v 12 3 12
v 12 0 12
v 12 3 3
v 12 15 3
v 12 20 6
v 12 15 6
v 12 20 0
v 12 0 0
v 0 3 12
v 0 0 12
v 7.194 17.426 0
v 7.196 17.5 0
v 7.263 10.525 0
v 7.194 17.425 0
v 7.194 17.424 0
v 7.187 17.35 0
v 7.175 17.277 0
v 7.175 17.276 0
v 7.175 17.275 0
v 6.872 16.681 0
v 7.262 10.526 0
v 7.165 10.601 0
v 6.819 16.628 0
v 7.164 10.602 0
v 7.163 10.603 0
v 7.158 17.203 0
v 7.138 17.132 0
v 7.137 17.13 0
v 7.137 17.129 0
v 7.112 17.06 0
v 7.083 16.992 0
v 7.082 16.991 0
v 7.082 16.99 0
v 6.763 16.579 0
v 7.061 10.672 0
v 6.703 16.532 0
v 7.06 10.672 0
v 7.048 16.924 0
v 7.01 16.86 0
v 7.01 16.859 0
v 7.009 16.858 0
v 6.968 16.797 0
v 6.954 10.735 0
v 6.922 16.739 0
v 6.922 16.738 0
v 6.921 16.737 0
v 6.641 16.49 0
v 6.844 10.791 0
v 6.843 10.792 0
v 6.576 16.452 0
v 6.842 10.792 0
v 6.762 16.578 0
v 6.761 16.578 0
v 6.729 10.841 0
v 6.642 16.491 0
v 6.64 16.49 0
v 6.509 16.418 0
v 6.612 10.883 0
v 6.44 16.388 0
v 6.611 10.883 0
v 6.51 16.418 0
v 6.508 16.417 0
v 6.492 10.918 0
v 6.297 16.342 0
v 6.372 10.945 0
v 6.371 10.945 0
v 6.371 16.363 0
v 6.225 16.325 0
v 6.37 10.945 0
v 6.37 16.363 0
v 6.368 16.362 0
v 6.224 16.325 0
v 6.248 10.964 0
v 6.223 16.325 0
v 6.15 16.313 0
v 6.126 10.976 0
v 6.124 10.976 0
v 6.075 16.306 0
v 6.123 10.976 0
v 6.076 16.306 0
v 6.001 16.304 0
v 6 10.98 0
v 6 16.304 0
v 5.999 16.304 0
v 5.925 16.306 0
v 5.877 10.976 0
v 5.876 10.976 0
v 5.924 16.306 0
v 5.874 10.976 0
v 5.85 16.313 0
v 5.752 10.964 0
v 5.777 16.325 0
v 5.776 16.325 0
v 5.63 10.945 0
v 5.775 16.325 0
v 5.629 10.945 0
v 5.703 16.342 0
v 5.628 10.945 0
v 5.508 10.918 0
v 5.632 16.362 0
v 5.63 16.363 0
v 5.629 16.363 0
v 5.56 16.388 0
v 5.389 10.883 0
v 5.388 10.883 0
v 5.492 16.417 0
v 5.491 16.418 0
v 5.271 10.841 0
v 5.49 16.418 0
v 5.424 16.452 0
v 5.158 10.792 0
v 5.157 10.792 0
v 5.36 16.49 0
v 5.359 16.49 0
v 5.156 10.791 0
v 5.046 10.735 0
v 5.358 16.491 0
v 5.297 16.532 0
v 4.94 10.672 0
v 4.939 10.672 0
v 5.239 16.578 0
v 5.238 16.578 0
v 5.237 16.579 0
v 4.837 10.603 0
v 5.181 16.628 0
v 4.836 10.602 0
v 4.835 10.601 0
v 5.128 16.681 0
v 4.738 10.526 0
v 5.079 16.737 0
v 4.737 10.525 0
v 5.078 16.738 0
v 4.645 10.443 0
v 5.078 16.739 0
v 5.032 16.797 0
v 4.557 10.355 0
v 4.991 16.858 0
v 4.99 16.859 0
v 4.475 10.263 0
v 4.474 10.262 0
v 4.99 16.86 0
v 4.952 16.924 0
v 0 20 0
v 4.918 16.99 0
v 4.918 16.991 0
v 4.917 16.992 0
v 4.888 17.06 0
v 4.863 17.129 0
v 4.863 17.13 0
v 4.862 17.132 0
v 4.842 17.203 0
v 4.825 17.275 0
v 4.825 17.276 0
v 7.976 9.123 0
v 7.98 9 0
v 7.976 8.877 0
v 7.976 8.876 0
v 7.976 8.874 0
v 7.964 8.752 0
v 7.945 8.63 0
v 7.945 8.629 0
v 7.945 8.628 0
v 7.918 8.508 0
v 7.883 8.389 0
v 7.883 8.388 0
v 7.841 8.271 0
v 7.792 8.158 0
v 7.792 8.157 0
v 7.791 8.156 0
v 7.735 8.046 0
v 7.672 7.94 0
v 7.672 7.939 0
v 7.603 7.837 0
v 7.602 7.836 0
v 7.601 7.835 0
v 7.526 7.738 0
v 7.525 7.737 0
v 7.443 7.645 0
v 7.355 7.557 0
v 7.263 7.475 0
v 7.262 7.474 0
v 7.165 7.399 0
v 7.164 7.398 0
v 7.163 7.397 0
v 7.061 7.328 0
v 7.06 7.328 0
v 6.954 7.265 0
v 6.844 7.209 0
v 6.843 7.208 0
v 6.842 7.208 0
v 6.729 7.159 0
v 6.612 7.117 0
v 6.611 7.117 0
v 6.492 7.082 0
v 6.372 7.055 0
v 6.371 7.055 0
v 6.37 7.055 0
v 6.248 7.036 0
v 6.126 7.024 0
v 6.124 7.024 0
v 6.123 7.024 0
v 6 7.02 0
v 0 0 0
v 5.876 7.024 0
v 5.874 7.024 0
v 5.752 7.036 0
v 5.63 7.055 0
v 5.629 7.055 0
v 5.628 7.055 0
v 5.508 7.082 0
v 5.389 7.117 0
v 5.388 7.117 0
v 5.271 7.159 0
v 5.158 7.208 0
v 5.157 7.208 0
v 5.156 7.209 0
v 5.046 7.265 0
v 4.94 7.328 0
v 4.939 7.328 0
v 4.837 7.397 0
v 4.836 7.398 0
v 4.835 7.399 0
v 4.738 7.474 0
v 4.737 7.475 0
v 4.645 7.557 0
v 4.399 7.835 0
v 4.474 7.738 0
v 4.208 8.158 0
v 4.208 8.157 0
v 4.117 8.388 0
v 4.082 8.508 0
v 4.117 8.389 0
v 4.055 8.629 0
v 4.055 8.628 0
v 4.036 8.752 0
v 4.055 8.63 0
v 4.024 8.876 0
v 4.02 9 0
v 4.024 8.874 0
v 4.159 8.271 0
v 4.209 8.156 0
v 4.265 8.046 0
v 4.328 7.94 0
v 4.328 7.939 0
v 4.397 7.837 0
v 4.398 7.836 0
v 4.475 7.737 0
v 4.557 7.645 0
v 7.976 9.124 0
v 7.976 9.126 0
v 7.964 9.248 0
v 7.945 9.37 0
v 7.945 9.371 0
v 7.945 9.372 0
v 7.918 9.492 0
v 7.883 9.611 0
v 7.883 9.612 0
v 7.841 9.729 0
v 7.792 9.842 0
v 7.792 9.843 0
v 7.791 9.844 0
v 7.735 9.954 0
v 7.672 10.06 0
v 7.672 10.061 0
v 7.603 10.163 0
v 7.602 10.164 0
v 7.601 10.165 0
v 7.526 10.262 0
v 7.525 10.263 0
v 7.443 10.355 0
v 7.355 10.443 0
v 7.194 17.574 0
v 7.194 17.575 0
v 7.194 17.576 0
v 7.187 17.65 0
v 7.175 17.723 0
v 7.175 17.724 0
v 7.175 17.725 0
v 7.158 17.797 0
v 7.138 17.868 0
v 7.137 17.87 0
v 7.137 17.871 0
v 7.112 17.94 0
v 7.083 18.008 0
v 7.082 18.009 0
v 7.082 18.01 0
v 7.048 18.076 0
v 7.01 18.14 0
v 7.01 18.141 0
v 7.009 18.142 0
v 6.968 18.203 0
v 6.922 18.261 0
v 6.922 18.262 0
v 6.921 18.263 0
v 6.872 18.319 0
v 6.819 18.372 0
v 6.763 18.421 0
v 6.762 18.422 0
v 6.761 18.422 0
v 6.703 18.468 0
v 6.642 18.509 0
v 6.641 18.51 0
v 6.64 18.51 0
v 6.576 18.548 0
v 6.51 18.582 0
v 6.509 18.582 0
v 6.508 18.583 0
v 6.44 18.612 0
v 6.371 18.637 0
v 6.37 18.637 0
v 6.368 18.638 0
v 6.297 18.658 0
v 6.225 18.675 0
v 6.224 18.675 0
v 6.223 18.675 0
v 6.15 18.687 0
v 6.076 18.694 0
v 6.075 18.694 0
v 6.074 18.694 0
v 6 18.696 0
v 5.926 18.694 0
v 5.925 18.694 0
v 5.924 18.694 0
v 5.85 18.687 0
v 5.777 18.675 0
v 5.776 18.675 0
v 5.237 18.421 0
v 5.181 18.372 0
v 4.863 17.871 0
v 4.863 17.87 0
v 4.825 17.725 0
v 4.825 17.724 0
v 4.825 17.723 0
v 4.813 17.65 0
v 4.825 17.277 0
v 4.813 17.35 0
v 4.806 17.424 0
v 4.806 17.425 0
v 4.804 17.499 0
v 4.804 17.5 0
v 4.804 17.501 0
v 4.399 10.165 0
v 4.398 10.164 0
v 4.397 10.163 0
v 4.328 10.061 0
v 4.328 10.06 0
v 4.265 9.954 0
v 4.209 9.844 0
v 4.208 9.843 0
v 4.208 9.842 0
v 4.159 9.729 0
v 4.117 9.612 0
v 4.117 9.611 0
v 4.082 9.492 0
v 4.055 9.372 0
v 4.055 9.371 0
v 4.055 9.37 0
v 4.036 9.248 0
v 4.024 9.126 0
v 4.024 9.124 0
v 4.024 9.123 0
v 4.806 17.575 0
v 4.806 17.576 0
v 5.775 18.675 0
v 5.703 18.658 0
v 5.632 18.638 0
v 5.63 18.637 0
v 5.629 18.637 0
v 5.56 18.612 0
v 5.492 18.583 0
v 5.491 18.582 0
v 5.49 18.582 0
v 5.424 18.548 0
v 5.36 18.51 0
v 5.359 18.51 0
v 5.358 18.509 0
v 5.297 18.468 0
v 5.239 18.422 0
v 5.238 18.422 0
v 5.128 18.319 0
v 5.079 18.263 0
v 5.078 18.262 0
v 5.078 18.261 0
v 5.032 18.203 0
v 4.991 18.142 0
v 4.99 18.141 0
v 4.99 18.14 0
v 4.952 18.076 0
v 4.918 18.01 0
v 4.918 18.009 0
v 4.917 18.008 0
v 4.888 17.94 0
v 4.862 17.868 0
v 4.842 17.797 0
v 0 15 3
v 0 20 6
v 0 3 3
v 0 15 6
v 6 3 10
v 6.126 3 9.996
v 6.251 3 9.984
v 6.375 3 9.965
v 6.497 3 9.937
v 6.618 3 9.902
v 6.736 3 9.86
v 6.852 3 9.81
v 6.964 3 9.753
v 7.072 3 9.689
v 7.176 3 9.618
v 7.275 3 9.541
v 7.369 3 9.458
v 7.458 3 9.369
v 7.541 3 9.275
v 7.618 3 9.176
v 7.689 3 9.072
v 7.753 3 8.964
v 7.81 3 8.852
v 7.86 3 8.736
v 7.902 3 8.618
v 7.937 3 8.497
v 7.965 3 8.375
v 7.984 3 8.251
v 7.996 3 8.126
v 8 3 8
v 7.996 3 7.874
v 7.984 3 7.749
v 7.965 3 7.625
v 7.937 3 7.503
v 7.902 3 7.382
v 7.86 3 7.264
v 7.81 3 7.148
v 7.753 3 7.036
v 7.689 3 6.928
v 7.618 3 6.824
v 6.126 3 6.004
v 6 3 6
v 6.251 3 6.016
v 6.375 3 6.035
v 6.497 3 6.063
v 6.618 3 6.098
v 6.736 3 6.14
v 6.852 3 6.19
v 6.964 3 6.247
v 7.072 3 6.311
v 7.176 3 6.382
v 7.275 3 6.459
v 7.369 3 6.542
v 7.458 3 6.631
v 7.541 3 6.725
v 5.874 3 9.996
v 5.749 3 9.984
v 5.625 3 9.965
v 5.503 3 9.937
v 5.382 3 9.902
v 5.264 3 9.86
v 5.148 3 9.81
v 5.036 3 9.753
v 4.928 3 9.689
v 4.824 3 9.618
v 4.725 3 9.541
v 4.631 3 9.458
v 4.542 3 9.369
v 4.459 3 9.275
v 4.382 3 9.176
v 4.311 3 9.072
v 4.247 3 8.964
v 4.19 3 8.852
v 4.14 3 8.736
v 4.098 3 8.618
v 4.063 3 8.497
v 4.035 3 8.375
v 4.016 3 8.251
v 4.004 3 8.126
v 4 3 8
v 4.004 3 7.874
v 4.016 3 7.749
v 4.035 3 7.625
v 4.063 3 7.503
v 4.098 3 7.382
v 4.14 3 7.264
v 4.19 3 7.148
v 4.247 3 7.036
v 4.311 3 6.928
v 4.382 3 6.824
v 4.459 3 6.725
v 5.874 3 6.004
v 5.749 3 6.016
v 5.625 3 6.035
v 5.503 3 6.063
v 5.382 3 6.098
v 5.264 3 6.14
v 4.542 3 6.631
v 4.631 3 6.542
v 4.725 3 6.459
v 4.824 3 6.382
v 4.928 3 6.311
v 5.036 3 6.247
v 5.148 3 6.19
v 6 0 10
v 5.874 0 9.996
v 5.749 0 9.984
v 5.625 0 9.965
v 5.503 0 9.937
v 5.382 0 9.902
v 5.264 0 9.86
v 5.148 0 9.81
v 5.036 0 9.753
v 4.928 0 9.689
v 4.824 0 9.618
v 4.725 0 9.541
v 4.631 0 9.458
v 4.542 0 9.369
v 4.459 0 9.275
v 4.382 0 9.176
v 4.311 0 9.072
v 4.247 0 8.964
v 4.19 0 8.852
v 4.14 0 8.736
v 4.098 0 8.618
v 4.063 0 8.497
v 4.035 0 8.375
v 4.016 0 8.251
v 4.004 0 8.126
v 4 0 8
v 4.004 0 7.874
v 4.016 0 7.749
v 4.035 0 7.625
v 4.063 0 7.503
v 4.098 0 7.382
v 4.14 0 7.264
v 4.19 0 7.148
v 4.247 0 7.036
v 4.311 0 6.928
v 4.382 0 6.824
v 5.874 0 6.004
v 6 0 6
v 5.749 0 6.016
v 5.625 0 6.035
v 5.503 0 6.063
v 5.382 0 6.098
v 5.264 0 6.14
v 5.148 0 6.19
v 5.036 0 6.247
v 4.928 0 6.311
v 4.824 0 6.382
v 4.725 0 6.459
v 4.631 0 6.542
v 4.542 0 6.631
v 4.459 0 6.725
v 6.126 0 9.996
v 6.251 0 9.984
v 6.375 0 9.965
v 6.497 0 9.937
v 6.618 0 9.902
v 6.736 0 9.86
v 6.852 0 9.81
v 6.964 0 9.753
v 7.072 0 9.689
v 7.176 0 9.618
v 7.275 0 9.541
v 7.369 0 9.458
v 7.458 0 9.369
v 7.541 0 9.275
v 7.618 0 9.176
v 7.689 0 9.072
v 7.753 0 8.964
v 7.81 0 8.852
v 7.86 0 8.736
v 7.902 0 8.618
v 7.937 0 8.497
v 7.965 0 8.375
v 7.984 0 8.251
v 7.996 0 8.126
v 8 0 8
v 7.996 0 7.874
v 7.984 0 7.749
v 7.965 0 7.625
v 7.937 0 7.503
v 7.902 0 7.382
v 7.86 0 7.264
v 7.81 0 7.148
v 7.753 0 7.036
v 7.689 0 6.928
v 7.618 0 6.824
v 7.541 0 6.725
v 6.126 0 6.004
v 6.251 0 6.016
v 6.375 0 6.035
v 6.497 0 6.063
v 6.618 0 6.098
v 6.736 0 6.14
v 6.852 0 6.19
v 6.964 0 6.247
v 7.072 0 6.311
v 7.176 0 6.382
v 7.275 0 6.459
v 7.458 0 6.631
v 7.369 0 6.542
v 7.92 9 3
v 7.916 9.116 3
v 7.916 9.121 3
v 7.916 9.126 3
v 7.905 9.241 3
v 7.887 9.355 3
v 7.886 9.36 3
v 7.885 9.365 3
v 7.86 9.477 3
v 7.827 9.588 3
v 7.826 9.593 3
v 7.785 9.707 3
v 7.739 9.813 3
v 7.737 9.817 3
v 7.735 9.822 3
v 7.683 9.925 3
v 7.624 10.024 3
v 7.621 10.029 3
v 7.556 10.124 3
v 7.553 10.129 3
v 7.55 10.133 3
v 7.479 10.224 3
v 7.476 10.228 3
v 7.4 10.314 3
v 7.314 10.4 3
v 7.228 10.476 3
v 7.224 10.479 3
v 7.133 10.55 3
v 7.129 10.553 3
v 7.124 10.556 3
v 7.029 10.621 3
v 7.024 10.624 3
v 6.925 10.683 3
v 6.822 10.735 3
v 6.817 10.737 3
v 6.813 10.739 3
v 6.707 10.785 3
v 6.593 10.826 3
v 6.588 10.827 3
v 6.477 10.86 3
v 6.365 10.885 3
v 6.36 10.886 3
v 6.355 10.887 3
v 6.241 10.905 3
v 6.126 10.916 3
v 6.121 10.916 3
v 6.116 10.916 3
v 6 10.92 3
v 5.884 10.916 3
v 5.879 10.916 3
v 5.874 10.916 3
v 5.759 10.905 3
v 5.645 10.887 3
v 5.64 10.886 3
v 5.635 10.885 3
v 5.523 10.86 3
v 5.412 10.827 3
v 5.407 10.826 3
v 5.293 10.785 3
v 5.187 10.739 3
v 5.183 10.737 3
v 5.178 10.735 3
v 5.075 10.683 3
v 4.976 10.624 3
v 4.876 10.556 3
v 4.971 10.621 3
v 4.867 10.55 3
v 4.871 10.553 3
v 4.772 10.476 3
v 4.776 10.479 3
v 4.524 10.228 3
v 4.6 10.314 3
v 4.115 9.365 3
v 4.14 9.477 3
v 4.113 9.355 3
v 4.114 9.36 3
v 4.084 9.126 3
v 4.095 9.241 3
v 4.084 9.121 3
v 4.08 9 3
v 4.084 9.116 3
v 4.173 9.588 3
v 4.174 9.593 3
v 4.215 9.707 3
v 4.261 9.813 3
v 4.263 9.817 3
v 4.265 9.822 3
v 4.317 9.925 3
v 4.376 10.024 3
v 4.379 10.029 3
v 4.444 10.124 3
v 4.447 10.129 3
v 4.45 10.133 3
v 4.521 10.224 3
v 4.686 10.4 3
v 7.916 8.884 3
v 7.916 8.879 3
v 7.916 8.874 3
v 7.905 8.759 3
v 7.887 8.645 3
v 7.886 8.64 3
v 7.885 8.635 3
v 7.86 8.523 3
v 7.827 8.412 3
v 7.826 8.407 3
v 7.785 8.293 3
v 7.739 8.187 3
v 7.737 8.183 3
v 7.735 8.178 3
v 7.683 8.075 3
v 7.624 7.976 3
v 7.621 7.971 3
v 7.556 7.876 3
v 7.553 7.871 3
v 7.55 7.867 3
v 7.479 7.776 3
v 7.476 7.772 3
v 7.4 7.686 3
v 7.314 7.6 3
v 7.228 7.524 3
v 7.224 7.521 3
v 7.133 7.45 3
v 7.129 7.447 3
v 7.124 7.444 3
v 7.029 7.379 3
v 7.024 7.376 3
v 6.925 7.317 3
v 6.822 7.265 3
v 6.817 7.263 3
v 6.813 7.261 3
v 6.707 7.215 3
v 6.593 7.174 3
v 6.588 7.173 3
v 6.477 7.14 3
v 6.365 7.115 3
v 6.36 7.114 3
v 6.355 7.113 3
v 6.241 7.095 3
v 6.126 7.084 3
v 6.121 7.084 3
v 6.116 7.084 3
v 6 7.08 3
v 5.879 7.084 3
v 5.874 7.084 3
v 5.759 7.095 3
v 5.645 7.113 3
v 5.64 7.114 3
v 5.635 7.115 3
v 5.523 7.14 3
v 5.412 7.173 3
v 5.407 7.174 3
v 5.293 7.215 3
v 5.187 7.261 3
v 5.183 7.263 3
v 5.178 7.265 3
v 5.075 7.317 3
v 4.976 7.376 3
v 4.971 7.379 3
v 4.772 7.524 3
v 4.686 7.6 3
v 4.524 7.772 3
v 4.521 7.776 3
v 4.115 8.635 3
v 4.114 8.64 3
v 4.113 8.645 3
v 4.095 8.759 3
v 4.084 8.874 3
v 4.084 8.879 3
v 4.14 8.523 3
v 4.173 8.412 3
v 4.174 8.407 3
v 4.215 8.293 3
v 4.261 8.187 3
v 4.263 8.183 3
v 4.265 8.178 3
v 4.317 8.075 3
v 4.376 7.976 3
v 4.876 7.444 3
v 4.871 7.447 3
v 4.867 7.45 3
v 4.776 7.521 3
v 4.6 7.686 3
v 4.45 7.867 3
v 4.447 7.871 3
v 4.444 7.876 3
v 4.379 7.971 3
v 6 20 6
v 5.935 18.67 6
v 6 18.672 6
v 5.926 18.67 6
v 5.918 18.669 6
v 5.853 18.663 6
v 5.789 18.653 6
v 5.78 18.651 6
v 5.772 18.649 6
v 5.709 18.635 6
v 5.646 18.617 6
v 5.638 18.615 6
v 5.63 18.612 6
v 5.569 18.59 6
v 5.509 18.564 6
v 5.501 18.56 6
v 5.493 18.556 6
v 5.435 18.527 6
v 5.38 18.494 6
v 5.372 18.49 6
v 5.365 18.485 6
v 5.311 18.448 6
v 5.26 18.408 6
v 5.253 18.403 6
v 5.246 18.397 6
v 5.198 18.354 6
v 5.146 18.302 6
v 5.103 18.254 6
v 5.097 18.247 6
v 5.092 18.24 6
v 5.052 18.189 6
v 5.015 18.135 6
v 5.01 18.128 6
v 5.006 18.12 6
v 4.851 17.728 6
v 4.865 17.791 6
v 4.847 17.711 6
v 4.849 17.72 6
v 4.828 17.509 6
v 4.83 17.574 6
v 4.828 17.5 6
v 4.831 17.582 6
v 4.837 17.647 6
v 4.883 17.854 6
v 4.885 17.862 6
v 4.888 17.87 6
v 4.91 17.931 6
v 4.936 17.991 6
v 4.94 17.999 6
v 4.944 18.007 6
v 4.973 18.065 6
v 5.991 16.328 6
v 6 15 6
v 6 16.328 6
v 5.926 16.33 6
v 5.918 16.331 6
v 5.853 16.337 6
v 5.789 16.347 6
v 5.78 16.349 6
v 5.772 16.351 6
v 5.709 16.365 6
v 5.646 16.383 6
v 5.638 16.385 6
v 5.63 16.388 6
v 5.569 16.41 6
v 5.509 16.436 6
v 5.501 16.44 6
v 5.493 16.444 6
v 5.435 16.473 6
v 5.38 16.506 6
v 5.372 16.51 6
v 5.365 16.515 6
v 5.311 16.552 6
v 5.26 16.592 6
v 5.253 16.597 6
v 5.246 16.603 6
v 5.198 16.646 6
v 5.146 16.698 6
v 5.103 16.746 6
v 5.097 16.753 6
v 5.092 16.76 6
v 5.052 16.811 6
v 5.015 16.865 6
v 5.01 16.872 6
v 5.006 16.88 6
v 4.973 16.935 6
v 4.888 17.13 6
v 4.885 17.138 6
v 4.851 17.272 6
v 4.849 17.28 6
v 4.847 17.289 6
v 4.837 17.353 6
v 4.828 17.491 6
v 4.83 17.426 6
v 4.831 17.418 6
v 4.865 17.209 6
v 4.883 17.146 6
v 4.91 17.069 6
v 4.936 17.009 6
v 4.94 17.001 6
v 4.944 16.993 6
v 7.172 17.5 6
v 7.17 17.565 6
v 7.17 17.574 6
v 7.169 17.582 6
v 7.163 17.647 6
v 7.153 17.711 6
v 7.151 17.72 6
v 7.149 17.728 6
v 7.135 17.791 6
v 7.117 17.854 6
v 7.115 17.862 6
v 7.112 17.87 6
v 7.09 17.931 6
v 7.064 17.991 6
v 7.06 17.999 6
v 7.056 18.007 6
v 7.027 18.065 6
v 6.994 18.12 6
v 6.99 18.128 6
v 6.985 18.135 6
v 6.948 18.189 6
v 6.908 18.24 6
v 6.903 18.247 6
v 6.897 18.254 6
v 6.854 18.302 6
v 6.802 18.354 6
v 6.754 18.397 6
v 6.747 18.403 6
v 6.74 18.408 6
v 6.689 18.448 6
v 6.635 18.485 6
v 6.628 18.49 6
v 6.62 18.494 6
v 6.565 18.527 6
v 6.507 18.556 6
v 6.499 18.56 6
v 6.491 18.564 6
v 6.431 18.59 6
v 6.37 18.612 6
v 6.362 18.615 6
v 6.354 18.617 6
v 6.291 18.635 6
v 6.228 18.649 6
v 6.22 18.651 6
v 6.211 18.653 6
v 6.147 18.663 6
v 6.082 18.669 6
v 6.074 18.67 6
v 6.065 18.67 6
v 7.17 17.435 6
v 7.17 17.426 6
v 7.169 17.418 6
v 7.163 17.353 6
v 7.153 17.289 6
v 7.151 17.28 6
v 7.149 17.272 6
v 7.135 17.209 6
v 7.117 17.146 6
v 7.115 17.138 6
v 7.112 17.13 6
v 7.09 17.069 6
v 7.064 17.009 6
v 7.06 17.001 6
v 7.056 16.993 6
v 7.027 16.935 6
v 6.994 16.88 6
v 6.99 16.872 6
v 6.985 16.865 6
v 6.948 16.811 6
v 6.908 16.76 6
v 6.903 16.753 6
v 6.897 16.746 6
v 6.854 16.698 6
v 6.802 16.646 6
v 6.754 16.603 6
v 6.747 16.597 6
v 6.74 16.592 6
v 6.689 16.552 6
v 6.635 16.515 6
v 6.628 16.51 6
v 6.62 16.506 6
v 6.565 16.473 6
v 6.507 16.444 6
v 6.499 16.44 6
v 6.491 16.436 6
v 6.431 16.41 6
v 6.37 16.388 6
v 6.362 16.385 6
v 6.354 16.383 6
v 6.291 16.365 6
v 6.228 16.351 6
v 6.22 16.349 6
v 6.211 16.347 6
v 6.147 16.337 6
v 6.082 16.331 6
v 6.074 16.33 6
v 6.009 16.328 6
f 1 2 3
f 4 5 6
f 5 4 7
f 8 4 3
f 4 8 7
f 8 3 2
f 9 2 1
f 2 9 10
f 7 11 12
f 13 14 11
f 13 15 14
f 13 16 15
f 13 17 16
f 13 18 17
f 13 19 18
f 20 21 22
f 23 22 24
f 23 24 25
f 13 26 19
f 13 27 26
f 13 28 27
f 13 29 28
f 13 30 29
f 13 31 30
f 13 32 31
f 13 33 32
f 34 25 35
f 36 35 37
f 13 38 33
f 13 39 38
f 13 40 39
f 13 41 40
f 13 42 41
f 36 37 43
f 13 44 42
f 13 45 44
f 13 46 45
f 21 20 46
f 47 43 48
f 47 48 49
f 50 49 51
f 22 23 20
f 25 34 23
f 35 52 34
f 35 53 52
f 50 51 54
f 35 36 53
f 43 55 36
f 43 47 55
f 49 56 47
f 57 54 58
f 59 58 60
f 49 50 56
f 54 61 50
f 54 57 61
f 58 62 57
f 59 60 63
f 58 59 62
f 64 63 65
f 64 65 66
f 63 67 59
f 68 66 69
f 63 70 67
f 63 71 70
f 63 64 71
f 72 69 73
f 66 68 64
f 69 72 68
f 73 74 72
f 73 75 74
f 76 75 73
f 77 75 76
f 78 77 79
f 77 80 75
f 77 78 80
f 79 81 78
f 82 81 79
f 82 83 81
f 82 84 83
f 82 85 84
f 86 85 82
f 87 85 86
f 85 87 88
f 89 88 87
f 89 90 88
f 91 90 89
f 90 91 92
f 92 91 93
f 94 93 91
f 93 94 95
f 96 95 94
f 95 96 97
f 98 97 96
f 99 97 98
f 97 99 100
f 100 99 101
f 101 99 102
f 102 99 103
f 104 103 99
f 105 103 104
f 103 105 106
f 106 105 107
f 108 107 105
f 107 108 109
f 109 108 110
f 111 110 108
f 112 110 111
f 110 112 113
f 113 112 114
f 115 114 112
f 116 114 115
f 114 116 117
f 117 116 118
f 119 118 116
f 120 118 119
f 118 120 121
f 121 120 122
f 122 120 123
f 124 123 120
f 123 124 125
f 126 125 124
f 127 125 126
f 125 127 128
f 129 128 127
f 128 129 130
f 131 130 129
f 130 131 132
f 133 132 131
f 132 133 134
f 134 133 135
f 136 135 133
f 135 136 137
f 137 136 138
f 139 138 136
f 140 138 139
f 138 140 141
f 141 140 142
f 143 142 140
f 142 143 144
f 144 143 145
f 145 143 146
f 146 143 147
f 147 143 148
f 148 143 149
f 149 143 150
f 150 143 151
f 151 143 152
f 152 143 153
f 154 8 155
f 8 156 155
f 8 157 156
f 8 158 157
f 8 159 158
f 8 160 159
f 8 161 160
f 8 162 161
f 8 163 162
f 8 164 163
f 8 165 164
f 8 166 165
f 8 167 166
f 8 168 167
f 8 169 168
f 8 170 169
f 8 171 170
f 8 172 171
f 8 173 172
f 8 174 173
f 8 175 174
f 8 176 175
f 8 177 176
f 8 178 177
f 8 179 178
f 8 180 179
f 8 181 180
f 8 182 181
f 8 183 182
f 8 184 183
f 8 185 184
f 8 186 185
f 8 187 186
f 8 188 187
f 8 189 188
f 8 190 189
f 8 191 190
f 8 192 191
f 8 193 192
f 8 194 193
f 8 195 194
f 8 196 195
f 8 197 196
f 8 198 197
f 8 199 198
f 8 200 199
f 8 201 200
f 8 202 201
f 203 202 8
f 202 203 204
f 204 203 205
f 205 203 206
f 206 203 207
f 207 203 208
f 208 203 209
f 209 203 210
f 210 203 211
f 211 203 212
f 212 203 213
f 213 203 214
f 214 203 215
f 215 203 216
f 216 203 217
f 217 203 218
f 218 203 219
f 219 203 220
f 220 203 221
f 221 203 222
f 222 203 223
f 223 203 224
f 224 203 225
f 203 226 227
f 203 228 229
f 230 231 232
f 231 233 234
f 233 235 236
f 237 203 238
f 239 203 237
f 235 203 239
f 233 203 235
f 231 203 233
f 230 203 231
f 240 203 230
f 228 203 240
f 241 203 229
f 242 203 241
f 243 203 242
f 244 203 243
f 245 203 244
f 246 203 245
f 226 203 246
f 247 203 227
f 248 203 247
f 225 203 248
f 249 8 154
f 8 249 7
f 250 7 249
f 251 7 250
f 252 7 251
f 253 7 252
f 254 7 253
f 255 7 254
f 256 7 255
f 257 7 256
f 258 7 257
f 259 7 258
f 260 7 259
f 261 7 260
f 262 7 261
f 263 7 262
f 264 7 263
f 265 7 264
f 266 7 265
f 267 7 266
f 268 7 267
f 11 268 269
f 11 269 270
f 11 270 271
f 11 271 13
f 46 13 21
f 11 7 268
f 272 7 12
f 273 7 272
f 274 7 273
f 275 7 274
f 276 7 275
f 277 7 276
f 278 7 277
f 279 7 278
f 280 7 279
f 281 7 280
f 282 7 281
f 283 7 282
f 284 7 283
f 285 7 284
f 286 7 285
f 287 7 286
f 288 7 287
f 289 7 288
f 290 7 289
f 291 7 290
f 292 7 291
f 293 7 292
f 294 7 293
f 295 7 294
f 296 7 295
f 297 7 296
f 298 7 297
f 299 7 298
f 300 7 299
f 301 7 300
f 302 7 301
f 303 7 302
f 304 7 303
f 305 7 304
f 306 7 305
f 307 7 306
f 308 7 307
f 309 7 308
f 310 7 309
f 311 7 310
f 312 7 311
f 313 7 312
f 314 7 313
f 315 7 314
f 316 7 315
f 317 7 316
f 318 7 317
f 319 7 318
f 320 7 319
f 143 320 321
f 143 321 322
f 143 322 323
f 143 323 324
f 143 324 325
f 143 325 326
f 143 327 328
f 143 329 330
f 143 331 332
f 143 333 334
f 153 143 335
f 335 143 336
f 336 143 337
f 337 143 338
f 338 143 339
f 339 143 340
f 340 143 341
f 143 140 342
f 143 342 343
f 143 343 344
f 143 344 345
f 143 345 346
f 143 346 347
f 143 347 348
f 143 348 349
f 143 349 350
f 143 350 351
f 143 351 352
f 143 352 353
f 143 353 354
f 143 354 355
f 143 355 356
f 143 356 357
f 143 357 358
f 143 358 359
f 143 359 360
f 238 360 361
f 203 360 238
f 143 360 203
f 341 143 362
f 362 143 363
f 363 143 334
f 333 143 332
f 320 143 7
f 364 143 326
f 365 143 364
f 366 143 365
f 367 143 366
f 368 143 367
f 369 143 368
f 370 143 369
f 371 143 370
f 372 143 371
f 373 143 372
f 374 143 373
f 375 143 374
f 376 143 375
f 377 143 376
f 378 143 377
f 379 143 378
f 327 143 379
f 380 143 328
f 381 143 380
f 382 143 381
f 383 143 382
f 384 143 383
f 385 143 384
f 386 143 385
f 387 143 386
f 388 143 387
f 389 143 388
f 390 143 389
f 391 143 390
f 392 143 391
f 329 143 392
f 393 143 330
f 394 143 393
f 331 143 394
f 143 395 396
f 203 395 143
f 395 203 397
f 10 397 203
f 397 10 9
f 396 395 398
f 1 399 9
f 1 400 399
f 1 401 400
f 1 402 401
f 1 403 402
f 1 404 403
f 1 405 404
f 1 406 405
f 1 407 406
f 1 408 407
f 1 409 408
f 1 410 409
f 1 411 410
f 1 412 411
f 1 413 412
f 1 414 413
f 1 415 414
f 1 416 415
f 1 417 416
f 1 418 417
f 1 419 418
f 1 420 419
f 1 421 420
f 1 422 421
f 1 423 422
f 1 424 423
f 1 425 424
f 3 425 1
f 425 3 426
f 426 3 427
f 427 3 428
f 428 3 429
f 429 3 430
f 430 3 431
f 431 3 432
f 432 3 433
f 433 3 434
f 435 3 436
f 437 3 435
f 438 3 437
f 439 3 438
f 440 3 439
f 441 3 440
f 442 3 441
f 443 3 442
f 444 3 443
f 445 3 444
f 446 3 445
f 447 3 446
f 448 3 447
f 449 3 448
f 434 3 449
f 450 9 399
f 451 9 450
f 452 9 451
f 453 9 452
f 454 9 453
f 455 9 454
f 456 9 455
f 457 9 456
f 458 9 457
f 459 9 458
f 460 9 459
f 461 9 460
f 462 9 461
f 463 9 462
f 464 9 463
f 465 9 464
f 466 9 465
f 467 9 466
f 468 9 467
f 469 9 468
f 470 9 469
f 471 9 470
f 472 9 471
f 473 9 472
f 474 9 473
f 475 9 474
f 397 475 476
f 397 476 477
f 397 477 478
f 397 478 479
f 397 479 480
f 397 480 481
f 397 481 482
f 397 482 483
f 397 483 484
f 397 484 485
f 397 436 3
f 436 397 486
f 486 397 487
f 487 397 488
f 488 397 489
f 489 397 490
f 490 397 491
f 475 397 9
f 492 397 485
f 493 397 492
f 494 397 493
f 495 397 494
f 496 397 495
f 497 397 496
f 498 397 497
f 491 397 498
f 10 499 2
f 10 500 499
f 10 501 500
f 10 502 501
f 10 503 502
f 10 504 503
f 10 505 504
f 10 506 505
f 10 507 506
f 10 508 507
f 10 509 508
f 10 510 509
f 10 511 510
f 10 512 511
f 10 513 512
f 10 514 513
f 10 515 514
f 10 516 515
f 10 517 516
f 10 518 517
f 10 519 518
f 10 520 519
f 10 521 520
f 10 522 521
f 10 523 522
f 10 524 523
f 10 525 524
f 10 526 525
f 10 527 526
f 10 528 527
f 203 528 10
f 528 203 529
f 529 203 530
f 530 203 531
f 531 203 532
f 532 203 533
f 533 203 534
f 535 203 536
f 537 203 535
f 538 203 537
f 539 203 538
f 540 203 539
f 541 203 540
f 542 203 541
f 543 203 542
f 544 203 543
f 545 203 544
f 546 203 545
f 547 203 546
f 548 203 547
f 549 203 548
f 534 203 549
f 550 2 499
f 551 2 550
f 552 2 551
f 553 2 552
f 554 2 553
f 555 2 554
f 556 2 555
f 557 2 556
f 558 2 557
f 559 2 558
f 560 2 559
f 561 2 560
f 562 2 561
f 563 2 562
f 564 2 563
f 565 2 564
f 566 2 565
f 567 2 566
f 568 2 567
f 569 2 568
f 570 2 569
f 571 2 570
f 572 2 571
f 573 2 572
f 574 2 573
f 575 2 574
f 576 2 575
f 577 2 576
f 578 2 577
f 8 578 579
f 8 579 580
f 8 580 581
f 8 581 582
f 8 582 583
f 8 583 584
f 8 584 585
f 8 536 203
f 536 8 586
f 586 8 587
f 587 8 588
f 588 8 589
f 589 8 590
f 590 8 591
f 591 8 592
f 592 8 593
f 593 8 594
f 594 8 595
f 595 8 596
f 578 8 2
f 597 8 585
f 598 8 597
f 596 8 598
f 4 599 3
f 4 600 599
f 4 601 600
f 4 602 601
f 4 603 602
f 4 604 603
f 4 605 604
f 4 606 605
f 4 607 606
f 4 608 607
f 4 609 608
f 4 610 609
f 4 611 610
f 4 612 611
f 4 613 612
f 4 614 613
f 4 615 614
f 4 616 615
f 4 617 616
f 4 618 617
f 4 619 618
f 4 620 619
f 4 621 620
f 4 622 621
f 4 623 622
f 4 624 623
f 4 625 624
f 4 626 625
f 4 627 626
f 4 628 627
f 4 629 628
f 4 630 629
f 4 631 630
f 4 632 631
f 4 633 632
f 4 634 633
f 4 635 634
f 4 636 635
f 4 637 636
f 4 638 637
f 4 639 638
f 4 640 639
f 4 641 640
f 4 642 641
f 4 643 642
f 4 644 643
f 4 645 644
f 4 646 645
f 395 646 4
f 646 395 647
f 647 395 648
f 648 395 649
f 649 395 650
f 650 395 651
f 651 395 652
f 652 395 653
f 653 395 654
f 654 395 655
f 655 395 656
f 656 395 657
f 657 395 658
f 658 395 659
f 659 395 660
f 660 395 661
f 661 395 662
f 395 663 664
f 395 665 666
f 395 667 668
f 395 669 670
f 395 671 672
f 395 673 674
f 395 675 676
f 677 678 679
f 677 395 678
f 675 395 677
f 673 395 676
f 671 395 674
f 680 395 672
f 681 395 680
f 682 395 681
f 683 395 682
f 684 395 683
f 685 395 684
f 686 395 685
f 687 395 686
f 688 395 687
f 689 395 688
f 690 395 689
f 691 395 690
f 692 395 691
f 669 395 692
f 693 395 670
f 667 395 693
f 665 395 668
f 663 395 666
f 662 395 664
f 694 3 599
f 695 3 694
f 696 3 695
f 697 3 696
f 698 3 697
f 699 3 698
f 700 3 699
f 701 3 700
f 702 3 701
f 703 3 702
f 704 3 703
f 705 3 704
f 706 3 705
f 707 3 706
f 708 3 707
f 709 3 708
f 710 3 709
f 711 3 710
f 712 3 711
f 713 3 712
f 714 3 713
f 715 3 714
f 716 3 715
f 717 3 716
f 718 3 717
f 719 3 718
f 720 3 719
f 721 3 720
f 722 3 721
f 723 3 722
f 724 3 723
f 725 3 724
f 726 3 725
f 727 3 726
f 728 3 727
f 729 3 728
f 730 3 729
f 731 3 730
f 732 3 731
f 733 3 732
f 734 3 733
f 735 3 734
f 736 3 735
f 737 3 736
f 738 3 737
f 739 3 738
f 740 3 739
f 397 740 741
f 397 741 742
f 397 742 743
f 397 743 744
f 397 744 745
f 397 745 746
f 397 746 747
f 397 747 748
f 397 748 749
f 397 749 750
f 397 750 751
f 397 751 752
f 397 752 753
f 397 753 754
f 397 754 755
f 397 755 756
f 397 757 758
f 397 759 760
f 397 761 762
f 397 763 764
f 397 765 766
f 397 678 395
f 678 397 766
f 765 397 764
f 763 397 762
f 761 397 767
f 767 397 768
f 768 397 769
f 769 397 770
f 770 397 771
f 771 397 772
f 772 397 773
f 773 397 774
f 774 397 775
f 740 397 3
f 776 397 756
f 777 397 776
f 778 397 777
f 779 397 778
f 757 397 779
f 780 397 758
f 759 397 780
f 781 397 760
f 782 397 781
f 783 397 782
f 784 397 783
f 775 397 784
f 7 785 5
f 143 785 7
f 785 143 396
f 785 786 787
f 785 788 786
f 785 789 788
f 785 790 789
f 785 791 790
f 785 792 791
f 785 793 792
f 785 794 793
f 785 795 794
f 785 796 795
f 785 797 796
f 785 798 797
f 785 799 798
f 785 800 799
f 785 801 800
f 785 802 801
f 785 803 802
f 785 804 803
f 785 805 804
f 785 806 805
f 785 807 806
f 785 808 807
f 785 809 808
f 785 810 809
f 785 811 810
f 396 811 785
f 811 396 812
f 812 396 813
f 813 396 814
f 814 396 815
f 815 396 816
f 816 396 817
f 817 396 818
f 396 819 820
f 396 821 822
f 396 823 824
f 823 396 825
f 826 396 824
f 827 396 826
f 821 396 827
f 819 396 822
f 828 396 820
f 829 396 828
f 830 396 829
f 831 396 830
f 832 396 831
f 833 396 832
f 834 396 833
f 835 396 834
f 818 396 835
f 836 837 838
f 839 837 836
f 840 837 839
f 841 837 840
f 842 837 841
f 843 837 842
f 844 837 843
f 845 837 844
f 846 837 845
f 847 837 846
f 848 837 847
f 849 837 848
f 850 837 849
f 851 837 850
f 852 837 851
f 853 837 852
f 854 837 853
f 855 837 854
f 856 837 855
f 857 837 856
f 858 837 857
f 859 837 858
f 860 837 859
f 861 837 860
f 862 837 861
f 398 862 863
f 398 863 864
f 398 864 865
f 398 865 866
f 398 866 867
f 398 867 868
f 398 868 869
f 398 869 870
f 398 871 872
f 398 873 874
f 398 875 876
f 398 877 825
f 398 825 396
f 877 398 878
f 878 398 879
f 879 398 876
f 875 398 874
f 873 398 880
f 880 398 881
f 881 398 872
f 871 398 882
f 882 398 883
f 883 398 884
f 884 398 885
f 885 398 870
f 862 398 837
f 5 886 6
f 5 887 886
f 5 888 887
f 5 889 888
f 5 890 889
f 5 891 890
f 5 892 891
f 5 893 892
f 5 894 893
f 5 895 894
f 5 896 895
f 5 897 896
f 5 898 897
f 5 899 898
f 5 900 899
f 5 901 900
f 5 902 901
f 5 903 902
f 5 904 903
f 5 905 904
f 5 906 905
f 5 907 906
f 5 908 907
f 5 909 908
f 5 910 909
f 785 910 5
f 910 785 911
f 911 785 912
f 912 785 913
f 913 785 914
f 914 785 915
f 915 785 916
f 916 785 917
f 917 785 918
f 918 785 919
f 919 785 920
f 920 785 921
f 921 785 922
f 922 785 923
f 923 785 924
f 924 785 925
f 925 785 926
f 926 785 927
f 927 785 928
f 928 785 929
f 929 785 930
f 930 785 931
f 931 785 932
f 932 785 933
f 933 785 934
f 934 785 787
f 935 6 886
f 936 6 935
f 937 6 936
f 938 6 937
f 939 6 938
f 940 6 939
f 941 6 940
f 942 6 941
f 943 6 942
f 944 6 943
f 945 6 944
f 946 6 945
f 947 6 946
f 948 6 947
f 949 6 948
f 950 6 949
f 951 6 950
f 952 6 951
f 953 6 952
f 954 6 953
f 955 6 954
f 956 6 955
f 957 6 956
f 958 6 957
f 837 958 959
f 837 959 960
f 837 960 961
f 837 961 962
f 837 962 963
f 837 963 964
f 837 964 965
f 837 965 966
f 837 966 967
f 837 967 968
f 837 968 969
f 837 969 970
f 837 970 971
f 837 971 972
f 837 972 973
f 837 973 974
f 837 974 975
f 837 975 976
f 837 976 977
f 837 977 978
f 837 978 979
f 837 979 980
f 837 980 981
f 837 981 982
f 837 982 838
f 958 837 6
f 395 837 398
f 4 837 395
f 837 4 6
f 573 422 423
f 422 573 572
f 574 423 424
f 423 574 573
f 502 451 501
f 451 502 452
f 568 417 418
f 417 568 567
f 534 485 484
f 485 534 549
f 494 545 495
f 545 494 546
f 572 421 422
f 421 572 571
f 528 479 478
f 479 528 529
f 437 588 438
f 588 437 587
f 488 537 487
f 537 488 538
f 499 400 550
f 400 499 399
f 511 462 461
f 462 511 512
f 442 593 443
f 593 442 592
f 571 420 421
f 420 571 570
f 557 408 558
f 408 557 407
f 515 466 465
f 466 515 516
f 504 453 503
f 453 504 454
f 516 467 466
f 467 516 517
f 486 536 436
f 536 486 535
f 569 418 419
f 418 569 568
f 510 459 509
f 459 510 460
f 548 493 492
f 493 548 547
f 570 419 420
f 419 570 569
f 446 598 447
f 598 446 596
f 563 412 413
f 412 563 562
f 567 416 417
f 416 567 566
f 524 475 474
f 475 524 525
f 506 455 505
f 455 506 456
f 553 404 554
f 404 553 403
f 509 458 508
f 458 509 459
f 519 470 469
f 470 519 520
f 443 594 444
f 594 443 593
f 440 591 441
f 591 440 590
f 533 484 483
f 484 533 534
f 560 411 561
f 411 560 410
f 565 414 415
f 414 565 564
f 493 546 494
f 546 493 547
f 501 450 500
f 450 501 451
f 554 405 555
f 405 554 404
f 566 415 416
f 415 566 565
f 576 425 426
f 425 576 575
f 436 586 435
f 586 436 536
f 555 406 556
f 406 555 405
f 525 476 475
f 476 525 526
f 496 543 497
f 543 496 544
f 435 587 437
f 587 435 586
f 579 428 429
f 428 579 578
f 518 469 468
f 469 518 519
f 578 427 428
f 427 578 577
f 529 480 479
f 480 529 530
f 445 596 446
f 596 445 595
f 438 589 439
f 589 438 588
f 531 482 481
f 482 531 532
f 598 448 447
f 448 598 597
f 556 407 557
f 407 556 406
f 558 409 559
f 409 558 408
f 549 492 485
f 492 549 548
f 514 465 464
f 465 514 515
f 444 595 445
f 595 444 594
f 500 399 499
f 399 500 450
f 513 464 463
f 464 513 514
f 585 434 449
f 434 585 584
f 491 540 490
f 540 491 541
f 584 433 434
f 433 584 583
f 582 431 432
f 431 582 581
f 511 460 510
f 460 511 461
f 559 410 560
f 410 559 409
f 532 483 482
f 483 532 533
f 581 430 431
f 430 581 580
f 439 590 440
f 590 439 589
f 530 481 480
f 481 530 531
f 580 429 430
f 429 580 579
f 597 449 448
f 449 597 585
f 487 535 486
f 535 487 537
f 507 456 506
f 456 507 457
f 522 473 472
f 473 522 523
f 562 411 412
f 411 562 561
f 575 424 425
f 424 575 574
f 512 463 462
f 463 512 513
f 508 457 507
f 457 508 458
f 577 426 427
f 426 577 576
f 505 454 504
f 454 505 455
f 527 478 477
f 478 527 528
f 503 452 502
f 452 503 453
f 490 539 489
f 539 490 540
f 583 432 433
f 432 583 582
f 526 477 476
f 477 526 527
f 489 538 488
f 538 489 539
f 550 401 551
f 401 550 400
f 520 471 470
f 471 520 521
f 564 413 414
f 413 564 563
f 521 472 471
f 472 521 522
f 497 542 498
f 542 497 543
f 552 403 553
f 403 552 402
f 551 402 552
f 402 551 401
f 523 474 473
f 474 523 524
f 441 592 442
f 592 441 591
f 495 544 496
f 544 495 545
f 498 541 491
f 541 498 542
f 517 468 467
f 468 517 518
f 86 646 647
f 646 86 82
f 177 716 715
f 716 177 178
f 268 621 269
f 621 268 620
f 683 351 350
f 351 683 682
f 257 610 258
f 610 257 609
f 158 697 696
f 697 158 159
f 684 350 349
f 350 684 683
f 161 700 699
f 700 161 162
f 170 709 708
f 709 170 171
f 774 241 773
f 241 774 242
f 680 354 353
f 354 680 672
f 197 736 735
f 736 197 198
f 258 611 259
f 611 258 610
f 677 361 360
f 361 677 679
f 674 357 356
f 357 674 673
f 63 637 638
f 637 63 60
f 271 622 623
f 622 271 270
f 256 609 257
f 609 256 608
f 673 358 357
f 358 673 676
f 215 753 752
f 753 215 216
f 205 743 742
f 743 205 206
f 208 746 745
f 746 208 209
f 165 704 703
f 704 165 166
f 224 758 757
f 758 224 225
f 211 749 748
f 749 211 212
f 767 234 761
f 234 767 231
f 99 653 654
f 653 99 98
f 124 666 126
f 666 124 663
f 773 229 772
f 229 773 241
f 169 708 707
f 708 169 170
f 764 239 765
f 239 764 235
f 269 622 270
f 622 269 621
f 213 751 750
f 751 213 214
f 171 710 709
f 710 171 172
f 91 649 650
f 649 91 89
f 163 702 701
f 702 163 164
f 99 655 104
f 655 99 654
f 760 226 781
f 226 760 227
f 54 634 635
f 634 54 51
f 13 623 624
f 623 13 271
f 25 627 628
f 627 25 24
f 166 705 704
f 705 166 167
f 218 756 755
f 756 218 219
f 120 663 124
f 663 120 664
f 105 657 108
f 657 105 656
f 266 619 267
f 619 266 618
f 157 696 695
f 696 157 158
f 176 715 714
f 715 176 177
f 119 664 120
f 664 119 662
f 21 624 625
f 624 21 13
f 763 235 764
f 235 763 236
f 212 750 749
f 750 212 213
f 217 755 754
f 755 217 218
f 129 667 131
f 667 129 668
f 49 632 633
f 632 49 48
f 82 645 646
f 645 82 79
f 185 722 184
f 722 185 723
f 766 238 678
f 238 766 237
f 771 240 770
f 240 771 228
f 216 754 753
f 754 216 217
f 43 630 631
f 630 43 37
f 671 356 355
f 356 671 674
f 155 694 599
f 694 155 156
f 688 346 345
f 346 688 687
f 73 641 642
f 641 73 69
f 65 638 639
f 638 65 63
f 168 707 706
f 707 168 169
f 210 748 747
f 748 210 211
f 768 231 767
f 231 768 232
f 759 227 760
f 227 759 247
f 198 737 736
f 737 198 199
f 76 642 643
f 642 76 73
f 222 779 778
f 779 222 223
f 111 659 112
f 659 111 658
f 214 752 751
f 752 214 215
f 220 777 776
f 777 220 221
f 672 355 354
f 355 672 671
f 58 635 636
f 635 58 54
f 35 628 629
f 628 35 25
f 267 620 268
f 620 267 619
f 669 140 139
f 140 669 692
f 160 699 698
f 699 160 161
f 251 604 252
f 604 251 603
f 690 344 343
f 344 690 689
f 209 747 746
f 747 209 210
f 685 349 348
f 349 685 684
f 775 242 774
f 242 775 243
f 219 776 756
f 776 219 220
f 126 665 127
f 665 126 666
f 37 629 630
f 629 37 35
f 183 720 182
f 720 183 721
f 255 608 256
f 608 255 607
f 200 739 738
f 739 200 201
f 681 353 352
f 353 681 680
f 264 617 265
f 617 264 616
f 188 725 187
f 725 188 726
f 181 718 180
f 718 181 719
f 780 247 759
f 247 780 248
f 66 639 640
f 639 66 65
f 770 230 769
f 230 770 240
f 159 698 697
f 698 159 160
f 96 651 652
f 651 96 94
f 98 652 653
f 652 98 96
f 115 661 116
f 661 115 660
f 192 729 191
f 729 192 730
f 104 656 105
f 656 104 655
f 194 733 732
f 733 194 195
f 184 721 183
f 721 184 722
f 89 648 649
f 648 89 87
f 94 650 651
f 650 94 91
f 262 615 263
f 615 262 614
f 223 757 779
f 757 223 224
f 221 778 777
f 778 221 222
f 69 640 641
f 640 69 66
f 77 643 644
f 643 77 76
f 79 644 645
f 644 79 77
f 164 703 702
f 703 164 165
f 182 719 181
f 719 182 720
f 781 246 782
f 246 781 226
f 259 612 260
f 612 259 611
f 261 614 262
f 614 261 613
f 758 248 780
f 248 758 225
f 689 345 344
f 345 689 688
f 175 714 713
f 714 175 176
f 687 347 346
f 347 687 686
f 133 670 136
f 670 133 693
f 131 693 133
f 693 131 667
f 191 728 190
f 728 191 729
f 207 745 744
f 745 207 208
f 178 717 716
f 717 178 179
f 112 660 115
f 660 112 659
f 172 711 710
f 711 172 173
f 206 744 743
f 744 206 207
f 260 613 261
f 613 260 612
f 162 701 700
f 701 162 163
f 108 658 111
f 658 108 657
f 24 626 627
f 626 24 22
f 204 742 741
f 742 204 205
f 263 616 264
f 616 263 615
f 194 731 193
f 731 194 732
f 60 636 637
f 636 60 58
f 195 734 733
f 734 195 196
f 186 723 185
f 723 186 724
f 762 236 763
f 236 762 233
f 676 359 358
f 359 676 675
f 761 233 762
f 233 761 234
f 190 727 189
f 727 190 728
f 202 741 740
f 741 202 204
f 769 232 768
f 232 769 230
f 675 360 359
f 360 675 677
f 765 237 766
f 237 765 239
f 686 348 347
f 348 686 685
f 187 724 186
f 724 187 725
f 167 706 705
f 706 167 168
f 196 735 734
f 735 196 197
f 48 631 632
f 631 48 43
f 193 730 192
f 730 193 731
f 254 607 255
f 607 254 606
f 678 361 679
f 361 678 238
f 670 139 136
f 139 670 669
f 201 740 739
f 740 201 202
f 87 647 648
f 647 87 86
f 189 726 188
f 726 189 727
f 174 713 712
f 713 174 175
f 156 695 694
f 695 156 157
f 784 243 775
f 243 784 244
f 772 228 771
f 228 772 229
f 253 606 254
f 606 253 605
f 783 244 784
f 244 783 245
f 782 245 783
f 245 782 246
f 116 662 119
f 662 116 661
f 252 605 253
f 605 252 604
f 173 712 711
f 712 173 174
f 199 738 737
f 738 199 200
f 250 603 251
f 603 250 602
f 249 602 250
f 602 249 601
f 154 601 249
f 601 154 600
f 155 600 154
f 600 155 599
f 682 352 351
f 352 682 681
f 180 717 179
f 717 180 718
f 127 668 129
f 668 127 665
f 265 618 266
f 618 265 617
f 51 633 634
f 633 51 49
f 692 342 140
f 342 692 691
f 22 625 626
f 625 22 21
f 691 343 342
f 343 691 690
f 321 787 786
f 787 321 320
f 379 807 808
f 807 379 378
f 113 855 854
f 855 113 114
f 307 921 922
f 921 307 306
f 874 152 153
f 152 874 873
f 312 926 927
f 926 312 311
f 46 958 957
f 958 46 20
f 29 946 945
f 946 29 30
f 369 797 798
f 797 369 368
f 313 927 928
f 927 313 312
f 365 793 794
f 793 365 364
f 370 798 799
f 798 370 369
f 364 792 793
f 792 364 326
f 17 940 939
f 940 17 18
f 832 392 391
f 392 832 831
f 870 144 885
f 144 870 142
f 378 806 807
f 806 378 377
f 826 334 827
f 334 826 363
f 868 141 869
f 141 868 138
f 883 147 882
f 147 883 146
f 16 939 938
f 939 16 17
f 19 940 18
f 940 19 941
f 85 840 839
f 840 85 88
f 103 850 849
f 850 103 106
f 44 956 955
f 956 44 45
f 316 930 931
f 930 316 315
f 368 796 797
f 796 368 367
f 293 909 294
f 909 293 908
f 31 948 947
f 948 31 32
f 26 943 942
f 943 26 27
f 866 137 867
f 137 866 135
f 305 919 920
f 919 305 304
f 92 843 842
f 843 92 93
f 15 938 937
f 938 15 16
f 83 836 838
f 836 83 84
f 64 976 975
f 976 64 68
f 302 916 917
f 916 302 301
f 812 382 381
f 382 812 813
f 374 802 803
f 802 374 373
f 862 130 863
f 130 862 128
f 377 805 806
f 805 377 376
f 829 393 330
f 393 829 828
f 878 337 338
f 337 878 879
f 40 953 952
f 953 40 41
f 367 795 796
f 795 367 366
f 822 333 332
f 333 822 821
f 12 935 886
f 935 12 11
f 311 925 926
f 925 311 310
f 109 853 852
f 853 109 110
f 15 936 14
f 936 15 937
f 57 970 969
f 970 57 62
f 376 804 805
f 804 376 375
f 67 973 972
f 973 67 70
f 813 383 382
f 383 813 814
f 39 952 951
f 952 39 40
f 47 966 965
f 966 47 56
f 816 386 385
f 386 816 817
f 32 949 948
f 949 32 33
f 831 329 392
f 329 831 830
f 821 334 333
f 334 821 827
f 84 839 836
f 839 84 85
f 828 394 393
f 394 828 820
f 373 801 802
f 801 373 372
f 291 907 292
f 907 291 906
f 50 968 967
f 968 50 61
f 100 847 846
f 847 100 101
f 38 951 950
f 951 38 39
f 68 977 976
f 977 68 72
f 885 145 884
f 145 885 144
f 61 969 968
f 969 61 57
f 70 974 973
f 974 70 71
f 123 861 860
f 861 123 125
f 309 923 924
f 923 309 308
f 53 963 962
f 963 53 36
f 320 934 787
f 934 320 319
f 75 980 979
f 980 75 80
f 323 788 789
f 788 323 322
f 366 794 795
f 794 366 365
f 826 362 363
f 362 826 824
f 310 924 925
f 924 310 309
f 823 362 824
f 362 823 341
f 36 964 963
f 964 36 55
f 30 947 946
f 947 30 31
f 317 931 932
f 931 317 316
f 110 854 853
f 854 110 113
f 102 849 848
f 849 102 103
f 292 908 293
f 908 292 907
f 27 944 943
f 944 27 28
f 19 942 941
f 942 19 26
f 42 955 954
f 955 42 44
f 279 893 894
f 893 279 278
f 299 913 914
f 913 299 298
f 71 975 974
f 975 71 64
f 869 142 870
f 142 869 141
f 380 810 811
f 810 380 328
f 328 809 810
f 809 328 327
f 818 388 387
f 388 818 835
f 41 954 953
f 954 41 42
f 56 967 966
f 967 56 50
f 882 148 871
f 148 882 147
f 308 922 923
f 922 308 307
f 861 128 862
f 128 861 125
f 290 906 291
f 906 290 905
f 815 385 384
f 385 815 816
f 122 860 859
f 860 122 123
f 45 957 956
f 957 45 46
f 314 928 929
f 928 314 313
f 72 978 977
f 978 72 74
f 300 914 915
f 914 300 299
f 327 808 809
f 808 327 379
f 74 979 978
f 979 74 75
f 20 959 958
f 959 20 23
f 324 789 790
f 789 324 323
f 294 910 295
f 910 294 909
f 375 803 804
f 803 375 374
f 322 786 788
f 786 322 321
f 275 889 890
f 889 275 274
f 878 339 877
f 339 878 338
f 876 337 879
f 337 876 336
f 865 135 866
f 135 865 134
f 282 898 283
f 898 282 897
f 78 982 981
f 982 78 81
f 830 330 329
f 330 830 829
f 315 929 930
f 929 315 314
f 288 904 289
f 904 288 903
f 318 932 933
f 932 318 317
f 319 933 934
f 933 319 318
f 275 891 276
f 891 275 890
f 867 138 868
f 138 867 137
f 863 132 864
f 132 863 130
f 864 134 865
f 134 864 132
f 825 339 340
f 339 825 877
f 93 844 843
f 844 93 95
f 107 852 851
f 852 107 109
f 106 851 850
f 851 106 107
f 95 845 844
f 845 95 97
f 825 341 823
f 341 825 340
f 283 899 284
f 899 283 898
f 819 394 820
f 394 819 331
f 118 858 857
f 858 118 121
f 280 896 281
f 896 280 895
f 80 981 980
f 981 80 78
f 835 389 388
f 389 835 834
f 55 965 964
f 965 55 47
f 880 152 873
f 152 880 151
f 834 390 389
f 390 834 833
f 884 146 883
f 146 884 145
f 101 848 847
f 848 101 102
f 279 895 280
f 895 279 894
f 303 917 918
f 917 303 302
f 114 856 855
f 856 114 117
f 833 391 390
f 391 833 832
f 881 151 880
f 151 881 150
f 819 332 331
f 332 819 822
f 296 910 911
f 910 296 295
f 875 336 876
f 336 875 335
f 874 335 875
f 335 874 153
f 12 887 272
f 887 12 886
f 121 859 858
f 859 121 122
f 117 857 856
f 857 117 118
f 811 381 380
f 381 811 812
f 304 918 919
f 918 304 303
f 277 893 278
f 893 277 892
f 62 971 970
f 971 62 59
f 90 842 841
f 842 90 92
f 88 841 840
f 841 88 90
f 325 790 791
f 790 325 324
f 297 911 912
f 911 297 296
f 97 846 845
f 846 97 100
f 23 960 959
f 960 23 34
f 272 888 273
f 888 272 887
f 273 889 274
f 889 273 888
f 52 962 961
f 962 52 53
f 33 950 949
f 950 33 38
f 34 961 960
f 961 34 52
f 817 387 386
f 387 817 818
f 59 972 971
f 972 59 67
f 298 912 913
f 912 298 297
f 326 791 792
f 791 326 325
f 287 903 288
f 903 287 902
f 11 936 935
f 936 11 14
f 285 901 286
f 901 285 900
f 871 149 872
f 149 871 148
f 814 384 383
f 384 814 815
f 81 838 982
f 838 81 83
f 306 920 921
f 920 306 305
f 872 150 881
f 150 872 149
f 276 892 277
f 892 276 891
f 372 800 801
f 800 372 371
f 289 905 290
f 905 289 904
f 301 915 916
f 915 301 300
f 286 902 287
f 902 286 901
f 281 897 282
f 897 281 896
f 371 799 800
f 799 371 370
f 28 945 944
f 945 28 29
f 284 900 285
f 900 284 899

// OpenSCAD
        difference(){
            union(){

                translate([0,0,0]){
                    cube([12,3,12], center=false);
                }      
                translate([0,0,0]){
                    cube([12,20,3], center=false);
                }      
                translate([0,20-5,0]){
                    cube([12,5,6], center=false);
                }      
                

            }
            union() {
                translate([6,50,8]){
                    rotate([90,0,0]){
                        cylinder(h=100, r=2, $fn=100, center=false);
                    }
                }  
                translate([6,9,-1]){
                    rotate([0,0,90]){
                        cylinder(h=50, r1=2, $fn=100, center=false);
                    }
                }  
                translate([6,17.5,-1]){
                    rotate([0,0,90]){
                        cylinder(h=50, r1=1.2, $fn=100, center=false);
                    }
                }  
                


            }
        }
